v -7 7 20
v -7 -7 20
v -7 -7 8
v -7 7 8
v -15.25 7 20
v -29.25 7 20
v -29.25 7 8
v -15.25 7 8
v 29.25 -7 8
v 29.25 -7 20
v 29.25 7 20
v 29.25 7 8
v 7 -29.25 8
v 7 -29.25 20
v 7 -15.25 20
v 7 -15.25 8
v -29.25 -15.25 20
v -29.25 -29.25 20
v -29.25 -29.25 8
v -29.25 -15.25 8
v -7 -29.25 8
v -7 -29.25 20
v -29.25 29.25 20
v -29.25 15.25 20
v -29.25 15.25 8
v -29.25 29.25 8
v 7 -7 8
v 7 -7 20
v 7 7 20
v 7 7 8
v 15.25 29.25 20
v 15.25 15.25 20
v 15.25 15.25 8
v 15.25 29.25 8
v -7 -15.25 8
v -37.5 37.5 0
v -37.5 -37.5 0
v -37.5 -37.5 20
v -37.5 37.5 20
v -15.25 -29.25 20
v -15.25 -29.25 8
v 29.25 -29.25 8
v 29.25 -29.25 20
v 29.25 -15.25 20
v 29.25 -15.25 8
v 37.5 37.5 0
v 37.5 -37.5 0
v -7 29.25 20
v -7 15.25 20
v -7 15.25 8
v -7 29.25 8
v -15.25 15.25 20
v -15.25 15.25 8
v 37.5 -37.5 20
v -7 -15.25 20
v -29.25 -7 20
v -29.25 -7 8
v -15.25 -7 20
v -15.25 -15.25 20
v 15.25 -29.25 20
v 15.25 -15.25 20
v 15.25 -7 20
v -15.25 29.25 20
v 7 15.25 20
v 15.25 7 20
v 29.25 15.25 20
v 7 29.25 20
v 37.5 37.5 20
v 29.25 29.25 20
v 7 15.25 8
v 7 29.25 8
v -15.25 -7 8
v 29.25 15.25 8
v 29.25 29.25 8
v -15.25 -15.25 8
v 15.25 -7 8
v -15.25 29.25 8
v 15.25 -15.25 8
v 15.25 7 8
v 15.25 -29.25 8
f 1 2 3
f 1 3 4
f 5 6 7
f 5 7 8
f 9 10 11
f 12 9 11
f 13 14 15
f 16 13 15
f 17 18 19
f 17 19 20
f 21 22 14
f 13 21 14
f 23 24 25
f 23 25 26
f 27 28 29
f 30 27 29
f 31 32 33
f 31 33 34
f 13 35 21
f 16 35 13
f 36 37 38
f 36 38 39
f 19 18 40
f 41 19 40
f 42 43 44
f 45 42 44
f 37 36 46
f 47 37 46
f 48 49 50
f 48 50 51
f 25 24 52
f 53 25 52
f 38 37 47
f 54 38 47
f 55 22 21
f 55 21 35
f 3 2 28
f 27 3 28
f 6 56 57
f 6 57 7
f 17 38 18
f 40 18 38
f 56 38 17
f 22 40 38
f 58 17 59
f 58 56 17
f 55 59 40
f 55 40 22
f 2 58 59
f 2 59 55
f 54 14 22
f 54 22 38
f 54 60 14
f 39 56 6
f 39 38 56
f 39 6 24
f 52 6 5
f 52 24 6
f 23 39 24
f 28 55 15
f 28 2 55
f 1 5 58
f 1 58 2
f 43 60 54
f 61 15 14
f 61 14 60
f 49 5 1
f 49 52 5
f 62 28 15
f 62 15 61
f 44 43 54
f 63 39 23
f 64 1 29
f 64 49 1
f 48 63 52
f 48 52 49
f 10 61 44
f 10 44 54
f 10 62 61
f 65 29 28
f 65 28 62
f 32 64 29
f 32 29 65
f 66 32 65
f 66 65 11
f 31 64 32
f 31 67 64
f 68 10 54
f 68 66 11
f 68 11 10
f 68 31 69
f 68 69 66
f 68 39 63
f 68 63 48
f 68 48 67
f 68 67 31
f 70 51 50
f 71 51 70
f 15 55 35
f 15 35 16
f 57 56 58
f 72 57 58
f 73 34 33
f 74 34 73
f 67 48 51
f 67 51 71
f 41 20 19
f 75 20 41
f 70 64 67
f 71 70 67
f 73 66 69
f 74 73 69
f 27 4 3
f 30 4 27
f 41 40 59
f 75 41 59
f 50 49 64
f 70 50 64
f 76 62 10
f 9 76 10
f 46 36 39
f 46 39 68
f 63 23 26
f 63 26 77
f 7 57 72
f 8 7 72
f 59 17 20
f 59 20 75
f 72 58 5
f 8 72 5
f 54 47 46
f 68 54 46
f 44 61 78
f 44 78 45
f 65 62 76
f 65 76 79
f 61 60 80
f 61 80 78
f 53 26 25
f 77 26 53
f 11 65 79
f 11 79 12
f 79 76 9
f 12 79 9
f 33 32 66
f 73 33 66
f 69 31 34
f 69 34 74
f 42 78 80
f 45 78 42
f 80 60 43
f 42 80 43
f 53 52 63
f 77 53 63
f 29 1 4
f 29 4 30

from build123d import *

# Parameters (mm, degrees)
F0_W     = 75
F0_H     = 75
F1_DEPTH = 20
F2_W     = 14
F2_H     = 14
F3_DEPTH = 12


with BuildPart() as f1:
    # F0 (on Top) → F1 (new body)
    with BuildSketch(Plane.XY):
        Rectangle(F0_W, F0_H)
    extrude(amount=F1_DEPTH)

    # F2 (on face) → F3 (cut)
    with BuildSketch(Plane.XY.offset(20)):
        Rectangle(F2_W, F2_H)
        with Locations((22.25, -22.25)):
            Rectangle(F2_W, F2_H)
        with Locations((22.25, 0)):
            Rectangle(F2_W, F2_H)
        with Locations((22.25, 22.25)):
            Rectangle(F2_W, F2_H)
        with Locations((0, 22.25)):
            Rectangle(F2_W, F2_H)
        with Locations((-22.25, 22.25)):
            Rectangle(F2_W, F2_H)
        with Locations((-22.25, 0)):
            Rectangle(F2_W, F2_H)
        with Locations((-22.25, -22.25)):
            Rectangle(F2_W, F2_H)
        with Locations((0, -22.25)):
            Rectangle(F2_W, F2_H)
    extrude(amount=-F3_DEPTH, mode=Mode.SUBTRACT)


solid = f1.part
